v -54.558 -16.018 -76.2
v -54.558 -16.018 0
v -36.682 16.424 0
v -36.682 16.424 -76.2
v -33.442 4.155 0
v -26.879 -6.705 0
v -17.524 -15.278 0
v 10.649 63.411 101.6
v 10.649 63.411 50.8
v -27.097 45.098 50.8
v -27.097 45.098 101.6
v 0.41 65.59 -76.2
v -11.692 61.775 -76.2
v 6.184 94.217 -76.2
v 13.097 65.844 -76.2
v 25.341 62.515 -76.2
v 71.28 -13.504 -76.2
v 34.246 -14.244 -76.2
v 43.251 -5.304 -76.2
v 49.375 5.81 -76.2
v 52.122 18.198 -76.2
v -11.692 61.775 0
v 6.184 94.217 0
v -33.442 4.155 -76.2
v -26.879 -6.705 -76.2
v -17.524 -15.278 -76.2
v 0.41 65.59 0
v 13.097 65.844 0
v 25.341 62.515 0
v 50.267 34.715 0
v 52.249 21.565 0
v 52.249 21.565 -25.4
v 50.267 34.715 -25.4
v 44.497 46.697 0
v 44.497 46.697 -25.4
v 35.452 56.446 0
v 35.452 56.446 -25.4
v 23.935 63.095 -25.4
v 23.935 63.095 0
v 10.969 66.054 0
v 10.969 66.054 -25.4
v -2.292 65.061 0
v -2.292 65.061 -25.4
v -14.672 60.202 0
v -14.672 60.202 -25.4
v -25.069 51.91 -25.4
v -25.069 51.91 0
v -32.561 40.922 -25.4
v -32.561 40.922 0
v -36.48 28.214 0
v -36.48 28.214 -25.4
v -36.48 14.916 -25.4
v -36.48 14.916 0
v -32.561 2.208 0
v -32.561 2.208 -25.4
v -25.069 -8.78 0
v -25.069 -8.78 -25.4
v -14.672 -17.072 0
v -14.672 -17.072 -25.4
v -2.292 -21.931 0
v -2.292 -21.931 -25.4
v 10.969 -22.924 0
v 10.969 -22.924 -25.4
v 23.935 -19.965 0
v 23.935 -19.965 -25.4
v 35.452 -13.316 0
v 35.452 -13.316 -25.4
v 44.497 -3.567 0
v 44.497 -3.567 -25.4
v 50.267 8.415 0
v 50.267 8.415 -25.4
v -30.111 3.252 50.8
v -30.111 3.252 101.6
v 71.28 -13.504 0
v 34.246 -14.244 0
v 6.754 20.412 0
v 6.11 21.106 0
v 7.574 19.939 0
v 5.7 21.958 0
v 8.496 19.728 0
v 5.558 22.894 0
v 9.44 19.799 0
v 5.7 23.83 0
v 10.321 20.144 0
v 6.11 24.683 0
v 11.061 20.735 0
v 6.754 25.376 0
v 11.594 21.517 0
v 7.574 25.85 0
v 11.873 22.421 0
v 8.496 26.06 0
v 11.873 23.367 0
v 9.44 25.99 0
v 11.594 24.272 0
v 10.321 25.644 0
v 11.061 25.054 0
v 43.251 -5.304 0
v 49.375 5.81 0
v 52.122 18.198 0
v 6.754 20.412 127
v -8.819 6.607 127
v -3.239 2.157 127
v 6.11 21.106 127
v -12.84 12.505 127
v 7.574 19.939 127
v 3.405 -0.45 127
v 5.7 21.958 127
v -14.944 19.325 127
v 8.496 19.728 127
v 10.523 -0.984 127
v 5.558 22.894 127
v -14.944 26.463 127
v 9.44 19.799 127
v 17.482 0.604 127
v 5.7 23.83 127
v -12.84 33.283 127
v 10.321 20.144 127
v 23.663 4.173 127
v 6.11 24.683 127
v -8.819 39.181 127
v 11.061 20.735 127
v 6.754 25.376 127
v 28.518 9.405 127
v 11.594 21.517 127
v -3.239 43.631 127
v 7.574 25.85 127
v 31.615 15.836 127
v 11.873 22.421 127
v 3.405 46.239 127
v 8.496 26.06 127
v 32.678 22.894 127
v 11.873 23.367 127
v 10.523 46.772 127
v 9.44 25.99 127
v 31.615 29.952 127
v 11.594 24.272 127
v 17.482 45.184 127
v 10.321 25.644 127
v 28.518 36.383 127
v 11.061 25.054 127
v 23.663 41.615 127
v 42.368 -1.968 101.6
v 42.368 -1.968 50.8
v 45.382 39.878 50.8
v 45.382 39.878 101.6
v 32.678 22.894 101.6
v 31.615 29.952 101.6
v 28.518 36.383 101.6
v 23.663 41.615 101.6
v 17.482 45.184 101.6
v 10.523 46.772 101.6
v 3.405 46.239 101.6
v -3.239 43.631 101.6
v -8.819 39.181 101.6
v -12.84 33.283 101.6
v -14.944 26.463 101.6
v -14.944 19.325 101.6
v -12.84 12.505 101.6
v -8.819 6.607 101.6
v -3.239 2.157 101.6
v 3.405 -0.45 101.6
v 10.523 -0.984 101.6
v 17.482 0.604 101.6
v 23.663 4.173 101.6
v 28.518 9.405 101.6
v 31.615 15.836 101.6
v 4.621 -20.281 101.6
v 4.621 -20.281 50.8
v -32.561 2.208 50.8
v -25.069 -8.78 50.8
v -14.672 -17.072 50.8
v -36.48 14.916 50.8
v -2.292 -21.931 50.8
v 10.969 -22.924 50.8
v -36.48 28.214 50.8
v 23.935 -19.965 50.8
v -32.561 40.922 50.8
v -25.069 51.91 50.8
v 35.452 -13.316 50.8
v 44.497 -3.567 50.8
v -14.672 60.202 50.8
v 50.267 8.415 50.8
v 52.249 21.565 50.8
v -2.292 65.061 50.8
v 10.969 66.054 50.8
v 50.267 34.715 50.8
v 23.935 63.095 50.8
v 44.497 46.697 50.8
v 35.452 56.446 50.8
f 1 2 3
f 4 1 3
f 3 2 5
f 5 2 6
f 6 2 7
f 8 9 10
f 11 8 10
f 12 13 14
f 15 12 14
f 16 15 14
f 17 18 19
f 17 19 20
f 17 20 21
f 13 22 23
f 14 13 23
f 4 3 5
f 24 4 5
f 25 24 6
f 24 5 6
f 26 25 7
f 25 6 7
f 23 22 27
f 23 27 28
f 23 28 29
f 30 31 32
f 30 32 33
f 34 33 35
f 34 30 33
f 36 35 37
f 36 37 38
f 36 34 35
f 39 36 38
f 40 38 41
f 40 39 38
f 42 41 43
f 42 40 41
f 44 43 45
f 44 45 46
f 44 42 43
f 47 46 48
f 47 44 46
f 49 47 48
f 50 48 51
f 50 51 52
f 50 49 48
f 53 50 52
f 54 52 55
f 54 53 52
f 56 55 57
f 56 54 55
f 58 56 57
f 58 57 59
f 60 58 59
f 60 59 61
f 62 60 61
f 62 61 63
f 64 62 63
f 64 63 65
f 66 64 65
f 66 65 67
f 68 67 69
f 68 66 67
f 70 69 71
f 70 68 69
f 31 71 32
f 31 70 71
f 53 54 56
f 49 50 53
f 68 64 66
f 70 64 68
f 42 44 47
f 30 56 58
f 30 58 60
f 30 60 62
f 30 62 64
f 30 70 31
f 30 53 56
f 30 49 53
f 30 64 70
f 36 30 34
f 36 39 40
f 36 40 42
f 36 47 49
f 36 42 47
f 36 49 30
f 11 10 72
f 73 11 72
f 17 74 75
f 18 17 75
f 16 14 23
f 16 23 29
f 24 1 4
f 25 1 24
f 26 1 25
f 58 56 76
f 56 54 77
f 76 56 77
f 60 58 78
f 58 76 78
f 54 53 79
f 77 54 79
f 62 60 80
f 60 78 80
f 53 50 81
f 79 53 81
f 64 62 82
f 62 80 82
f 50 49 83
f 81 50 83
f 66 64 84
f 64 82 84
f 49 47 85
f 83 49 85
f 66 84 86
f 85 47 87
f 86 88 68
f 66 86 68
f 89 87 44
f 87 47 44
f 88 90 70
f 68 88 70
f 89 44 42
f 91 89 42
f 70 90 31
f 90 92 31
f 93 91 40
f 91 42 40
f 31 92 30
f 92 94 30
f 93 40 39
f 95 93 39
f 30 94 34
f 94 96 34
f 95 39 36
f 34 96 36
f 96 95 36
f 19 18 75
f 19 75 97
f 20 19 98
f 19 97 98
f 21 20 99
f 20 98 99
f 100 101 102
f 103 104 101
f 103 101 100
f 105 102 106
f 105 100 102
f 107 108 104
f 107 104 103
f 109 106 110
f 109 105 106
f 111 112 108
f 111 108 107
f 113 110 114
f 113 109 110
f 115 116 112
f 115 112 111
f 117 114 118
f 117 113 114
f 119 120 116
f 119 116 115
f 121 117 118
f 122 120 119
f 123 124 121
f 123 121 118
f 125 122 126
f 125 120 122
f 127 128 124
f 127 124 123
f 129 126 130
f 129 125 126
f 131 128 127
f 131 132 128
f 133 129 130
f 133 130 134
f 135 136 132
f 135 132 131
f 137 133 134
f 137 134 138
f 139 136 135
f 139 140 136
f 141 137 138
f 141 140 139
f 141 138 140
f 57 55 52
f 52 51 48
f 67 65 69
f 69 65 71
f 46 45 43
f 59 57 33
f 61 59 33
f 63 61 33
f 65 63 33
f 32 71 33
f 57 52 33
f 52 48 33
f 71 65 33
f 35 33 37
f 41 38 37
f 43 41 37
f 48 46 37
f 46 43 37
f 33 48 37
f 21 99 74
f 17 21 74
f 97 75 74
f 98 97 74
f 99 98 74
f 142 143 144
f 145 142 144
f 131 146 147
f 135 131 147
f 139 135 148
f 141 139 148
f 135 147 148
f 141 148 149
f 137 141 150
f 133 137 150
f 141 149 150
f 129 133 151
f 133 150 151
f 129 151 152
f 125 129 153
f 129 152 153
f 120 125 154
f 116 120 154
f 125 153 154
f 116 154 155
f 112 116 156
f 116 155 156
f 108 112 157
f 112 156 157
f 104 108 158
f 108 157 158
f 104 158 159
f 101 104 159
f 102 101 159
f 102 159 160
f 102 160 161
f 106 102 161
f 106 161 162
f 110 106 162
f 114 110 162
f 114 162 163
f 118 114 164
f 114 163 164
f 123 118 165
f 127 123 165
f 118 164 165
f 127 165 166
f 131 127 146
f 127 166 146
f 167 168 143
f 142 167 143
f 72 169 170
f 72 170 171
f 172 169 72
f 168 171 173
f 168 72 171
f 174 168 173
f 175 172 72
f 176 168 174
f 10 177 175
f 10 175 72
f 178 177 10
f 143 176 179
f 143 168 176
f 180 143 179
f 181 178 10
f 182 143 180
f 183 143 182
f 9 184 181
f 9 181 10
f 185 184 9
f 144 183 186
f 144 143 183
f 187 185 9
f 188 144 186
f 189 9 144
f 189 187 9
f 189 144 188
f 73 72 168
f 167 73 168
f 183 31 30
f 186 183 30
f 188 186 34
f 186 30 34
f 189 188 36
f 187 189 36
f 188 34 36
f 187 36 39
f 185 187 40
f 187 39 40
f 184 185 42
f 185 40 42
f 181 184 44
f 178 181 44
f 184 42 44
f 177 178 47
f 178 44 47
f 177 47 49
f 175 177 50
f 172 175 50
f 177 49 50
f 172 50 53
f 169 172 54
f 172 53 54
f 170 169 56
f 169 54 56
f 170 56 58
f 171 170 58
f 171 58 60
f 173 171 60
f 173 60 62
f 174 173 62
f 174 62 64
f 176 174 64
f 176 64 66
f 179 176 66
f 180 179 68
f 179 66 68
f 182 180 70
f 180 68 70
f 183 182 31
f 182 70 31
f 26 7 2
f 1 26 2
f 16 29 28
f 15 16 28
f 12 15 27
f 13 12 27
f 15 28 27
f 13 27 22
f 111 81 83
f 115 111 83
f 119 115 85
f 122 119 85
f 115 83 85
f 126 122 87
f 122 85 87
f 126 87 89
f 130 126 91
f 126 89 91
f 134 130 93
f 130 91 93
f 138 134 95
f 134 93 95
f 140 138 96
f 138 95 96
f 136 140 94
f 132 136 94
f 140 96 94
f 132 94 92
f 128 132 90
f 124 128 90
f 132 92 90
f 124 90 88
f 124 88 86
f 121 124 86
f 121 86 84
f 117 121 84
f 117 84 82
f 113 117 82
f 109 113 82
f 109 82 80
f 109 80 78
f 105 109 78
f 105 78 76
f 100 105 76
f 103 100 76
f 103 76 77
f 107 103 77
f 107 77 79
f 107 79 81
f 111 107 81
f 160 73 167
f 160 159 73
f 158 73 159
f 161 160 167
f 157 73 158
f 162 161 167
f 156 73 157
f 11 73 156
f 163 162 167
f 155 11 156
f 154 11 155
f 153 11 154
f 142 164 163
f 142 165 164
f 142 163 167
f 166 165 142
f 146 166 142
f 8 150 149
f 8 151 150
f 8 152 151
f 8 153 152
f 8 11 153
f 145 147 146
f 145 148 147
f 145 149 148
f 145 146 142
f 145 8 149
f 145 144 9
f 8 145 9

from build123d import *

# Parameters (mm, degrees)
F0_R     = 44.6141423475
F1_DEPTH = 50.8
F3_DEPTH = 50.8
F5_DEPTH = 76.2
F6_DEPTH = 25.4
F7_R     = 23.9448612964
F8_DEPTH = 25.4
F11_D    = 6.35


with BuildPart() as f1:
    # F0 (on Top) → F1 (new body)
    with BuildSketch(Plane.XY):
        with Locations((7.6353494078, 21.5649604797)):
            Circle(F0_R)
    extrude(amount=F1_DEPTH)

    # F2 (on face) → F3 (join)
    with BuildSketch(Plane.XY.offset(50.8)):
        Polygon((10.6493027537, 63.4105465469), (-27.0970144897, 45.0979136767), (-30.1109678356, 3.2523276095), (4.6213960619, -20.2806255875), (42.3677133053, -1.9679927173), (45.3816666512, 39.8775933499), align=None)
    extrude(amount=F3_DEPTH)


with BuildPart() as f5:
    # F4 (on face) → F5 (new body)
    with BuildSketch(Plane(origin=(0, 0, 0), x_dir=(1, 0, 0), z_dir=(0, 0, -1))):
        with BuildLine():
            Line((-54.5576916577, 16.0181814927), (-36.6815848341, -16.4238480705))
            ThreePointArc((-36.6815848341, -16.4238480705), (-30.5483654923, 1.509389215), (-17.5240164939, 15.2783293412))
            Line((-17.5240164939, 15.2783293412), (-54.5576916577, 16.0181814927))
        make_face()
    extrude(amount=F5_DEPTH)


with BuildPart() as f5b:
    # F4 (on face) → F5, piece 2 (new body)
    with BuildSketch(Plane(origin=(0, 0, 0), x_dir=(1, 0, 0), z_dir=(0, 0, -1))):
        with BuildLine():
            ThreePointArc((34.2461504788, 14.2440741869), (46.7101798692, -0.0340682128), (52.1222573025, -18.1979553762))
            Line((52.1222573025, -18.1979553762), (71.2798256427, 13.5042220354))
            Line((71.2798256427, 13.5042220354), (34.2461504788, 14.2440741869))
        make_face()
    extrude(amount=F5_DEPTH)


with BuildPart() as f5c:
    # F4 (on face) → F5, piece 3 (new body)
    with BuildSketch(Plane(origin=(0, 0, 0), x_dir=(1, 0, 0), z_dir=(0, 0, -1))):
        with BuildLine():
            Line((-11.6921925853, -61.7752554041), (6.1839142384, -94.2172849673))
            Line((6.1839142384, -94.2172849673), (25.3414825786, -62.5151075557))
            ThreePointArc((25.3414825786, -62.5151075557), (6.7442338464, -66.1702024414), (-11.6921925853, -61.7752554041))
        make_face()
    extrude(amount=F5_DEPTH)


with BuildPart() as f6:
    # F6 (new): a face of the model
    f6_faces = [f1.part.faces().sort_by_distance(p)[0] for p in [
        (7.6353494078, 21.5649604797, 0),
    ]]
    extrude(f6_faces, amount=F6_DEPTH)


with BuildPart() as f1_1:
    add(f1.part)

    # F7 (on face) → F8 (join)
    with BuildSketch(Plane.XY.offset(101.6)):
        with Locations((8.7334895507, 22.8941198438)):
            Circle(F7_R)
    extrude(amount=F8_DEPTH)

    # F11 (through all)
    with Locations(Plane.XY.offset(127)):
        with Locations((8.7334895507, 22.8941198438)):
            Hole(F11_D / 2)


solid = Compound([f5.part, f5b.part, f5c.part, f6.part, f1_1.part])
